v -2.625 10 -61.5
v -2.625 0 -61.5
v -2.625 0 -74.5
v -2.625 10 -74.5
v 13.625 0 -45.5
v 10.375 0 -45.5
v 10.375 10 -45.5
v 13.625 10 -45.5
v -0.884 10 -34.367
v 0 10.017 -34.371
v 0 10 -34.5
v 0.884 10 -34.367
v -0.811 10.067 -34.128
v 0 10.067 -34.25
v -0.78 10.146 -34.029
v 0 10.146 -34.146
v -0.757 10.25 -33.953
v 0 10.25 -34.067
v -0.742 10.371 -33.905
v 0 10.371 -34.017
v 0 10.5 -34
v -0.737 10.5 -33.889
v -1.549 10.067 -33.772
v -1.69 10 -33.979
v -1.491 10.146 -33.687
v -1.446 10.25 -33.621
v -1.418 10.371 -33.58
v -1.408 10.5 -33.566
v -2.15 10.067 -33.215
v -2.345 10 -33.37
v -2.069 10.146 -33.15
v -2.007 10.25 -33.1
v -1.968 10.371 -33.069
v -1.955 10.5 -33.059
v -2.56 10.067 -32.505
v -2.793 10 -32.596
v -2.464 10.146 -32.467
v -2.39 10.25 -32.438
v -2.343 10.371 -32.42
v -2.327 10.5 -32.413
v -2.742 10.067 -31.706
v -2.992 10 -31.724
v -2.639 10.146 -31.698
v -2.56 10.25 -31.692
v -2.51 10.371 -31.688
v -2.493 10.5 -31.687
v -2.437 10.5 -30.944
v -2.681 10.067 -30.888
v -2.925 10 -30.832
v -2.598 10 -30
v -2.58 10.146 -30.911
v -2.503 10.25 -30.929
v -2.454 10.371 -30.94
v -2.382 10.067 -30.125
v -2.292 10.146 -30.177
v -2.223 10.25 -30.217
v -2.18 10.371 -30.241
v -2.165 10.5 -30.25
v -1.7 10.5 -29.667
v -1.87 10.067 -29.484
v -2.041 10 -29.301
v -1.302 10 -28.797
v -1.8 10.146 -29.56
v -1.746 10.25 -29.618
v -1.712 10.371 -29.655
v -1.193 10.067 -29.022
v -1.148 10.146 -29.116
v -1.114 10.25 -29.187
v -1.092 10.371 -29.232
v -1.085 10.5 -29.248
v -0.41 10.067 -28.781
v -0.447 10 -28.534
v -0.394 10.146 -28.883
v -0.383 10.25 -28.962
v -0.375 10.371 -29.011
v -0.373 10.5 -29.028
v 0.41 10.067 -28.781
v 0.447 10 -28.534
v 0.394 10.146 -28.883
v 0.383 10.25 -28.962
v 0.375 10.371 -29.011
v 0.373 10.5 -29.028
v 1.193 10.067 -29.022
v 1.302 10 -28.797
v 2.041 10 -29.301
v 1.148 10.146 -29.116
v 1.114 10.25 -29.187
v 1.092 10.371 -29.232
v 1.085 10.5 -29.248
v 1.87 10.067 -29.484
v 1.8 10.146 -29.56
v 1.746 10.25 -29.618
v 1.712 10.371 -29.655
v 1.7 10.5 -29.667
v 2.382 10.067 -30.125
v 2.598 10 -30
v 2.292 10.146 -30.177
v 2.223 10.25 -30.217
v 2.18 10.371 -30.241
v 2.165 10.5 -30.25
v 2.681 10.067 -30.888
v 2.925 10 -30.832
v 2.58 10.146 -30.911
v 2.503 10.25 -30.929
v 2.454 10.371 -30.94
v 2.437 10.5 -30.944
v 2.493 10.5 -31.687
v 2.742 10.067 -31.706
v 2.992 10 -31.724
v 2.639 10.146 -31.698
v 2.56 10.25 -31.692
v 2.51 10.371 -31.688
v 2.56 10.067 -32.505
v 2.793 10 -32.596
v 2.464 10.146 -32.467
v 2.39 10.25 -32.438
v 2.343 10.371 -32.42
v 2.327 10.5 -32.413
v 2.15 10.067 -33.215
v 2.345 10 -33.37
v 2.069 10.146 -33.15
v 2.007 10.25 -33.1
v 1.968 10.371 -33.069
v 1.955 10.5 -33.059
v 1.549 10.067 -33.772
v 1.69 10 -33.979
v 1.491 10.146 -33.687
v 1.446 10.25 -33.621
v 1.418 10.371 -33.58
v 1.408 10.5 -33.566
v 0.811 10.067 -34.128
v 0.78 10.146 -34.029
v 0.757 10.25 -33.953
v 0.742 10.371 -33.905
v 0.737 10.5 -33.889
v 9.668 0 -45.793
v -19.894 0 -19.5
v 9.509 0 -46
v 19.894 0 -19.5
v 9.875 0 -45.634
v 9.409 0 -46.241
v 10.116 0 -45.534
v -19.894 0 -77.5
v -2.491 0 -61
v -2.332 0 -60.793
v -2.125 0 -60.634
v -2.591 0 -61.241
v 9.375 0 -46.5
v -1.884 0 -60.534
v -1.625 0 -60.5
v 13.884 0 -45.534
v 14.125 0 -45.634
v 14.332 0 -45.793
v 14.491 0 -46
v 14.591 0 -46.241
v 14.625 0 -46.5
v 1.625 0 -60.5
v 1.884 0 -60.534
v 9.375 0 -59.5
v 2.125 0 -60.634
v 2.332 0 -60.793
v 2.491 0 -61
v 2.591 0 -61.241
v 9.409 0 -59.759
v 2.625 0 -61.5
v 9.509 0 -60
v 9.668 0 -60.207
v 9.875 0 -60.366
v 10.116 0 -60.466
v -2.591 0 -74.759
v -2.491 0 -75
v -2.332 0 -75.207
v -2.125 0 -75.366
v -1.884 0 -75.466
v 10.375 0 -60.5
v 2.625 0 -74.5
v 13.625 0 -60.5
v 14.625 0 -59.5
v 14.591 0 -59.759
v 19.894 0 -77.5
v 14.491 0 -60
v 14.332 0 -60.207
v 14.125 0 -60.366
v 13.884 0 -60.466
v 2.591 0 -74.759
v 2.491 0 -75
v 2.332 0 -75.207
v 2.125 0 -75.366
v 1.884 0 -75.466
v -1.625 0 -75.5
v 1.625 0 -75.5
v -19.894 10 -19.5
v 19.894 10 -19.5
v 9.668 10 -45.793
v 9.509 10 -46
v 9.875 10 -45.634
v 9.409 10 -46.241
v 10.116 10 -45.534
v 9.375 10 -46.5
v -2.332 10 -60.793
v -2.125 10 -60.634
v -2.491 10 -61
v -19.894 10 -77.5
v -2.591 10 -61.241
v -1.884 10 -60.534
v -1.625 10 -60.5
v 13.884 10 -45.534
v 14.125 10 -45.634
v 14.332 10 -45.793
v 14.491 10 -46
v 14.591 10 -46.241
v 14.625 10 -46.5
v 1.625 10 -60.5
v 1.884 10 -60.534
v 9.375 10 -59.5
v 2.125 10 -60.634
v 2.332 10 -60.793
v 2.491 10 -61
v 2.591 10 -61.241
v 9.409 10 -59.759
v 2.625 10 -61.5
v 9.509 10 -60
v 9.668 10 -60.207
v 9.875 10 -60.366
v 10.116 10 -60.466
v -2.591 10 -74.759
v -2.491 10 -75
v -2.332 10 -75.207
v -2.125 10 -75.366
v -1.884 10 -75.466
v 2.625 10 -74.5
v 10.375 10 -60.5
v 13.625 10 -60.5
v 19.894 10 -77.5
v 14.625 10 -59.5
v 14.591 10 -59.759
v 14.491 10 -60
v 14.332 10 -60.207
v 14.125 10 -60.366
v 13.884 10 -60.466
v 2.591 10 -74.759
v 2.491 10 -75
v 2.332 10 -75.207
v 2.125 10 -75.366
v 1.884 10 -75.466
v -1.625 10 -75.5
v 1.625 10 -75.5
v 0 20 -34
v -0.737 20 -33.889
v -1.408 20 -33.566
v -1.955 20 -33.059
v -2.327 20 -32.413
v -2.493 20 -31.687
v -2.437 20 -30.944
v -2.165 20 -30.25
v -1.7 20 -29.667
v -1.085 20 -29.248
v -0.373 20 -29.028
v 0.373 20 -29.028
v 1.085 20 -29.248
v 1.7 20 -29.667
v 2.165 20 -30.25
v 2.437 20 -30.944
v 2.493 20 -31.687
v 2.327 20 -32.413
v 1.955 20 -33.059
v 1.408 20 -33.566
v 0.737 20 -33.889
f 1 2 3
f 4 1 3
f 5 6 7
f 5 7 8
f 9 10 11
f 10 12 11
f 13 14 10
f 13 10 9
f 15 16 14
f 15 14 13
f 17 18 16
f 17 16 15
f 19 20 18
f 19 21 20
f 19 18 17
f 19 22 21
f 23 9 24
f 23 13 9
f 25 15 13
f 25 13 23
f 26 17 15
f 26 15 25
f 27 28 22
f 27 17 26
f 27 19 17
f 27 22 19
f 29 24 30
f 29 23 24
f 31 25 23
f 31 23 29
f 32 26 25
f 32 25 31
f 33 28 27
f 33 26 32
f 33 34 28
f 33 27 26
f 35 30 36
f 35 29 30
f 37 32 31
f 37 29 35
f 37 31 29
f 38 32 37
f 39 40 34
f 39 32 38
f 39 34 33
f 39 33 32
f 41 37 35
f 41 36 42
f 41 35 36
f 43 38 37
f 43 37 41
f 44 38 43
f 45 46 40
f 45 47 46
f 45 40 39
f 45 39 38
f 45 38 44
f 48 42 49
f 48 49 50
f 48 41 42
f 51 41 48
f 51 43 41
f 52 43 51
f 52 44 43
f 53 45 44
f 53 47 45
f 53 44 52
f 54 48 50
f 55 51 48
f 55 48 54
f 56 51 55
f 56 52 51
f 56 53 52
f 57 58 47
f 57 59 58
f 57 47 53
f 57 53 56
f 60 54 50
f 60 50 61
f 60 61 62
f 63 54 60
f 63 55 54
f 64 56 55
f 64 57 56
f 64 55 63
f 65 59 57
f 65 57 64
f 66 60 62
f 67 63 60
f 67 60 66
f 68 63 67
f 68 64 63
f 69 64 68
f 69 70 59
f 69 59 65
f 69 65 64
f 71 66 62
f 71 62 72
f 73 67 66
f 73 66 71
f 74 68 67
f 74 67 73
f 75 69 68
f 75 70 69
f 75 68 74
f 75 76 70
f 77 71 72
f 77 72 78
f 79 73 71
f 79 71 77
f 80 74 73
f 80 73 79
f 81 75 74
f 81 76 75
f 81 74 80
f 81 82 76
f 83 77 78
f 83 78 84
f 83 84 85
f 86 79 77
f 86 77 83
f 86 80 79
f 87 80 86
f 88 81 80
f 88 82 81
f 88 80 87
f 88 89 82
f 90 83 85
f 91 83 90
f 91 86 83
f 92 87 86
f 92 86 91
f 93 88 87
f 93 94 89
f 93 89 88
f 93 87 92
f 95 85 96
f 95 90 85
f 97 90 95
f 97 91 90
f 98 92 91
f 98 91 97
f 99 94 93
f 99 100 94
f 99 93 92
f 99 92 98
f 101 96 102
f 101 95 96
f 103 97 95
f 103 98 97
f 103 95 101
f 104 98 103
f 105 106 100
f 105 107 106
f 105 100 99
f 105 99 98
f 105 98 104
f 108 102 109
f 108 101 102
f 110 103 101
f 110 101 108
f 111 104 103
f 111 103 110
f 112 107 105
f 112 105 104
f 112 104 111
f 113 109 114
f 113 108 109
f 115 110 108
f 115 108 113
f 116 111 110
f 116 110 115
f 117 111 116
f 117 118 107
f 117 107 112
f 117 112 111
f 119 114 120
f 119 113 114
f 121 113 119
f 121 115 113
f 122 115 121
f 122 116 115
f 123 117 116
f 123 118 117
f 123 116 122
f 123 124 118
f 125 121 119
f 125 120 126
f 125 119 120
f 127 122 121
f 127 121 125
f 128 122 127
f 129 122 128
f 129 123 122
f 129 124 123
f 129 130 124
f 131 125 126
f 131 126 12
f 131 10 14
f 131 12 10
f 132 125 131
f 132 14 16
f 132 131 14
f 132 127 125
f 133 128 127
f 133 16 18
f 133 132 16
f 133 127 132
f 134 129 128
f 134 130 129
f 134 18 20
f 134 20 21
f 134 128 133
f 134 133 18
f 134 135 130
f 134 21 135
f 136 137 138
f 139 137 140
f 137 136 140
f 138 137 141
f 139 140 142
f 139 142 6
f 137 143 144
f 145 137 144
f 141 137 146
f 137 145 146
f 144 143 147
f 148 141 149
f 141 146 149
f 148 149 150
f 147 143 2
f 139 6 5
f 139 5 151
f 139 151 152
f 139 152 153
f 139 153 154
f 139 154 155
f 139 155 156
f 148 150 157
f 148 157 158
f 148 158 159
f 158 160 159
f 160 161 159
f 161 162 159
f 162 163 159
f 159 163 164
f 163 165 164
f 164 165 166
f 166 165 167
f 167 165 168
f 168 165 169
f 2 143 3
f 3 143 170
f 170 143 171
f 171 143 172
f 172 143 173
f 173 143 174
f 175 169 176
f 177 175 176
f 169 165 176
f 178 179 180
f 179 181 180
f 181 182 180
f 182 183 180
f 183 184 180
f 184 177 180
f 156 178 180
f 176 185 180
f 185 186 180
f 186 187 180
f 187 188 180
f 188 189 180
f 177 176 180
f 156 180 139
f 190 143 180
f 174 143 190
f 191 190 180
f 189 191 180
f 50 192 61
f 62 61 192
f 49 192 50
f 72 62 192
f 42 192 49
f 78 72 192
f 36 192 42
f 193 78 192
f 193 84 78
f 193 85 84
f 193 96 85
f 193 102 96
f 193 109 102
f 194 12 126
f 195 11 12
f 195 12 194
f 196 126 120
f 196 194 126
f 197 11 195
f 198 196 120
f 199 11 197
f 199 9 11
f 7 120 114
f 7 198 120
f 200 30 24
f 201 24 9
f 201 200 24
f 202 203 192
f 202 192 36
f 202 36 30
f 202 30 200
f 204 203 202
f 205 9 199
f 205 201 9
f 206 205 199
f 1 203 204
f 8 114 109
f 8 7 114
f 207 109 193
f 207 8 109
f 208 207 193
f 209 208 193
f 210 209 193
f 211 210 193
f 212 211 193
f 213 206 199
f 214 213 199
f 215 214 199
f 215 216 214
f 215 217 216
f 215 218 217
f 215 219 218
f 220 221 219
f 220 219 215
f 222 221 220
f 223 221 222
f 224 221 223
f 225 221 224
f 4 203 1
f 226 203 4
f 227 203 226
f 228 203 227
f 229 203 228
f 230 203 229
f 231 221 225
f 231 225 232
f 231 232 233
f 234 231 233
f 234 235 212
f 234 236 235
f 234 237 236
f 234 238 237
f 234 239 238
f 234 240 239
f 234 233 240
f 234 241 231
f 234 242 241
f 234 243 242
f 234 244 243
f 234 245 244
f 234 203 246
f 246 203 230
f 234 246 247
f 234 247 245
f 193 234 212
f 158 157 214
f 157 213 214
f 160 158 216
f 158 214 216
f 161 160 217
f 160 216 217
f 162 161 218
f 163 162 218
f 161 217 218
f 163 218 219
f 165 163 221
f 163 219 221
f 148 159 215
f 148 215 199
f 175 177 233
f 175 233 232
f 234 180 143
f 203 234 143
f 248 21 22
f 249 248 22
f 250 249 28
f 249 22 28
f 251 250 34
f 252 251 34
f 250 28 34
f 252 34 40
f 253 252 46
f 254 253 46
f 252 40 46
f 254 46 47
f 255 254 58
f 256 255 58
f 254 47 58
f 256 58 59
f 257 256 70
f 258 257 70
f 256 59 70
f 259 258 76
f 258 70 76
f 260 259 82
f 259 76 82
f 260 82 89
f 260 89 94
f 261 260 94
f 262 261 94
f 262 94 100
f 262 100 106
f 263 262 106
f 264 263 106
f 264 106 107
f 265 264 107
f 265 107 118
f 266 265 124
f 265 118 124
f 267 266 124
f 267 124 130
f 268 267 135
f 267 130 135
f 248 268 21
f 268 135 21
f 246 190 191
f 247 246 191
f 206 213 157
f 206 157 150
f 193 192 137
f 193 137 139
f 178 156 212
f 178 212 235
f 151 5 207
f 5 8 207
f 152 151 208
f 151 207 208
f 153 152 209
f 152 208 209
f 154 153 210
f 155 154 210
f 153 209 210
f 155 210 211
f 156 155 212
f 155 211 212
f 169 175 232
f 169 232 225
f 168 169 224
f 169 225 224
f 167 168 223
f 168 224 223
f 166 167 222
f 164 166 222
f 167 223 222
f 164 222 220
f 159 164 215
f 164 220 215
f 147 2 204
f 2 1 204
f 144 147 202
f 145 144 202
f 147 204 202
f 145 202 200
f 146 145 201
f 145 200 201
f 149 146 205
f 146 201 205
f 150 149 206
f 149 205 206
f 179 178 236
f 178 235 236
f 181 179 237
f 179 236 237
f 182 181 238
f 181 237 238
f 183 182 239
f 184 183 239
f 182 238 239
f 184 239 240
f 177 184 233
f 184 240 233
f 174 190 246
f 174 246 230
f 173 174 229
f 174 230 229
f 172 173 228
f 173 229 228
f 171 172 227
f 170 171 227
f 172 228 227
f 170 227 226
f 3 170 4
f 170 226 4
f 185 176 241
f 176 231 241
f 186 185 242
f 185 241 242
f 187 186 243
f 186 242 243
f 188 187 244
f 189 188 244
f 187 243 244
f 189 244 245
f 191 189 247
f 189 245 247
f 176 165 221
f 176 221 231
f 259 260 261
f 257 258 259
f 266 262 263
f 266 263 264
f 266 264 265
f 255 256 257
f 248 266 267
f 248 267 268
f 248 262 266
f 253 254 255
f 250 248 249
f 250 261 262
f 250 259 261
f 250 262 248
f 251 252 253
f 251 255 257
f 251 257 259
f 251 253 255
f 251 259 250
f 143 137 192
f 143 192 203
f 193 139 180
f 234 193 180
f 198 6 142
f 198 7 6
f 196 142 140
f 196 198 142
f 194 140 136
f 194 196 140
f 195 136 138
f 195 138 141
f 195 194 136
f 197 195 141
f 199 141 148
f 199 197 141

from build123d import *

# Parameters (mm, degrees)
BOSS_EXTRUDE1_DEPTH  = 10
FILLET2_R            = 1
FILLET2_OF_MIRROR1_R = 1
CUT_EXTRUDE1_DEPTH   = 81.635062113
FILLET3_R            = 1
SKETCH5_R            = 2.5
BOSS_EXTRUDE2_DEPTH  = 10
FILLET1_R            = 0.5
SKETCH6_W            = 39.78759817
SKETCH6_H            = 34
CUT_EXTRUDE2_DEPTH   = 10


with BuildPart() as part:
    # Sketch2 → Boss-Extrude1 (new body)
    with BuildSketch(Plane(origin=(0, 0, 0), x_dir=(1, 0, 0), z_dir=(0, 1, 0))):
        Polygon((-19.893799085, 77.5), (0, 77.5), (0, 75.5), (-2.625, 75.5), (-2.625, 73), (-2.625, 63), (-2.625, 60.5), (0, 60.5), (0, 60.375), (0, 2.5), (-2.625, 2.5), (-2.625, 0), (-2.625, -10), (-2.625, -12.5), (0, -12.5), (0, -14.5), (-19.893799085, -14.5), align=None)
    boss_extrude1 = extrude(amount=BOSS_EXTRUDE1_DEPTH)

    # Fillet2
    fillet2_edges = [part.edges().sort_by_distance(p)[0] for p in [
        (-2.625, 5, 12.5),
        (-2.625, 5, -2.5),
        (-2.625, 5, -60.5),
        (-2.625, 5, -75.5),
    ]]
    fillet(fillet2_edges, radius=FILLET2_R)

    # Mirror1: Boss-Extrude1 across Right Plane
    add(boss_extrude1.mirror(Plane(origin=(0, 0, 0), x_dir=(0, 0, -1), z_dir=(1, 0, 0))))

    # Fillet2 of Mirror1
    fillet2_of_mirror1_edges = [part.edges().sort_by_distance(p)[0] for p in [
        (2.625, 5, 12.5),
        (2.625, 5, -2.5),
        (2.625, 5, -60.5),
        (2.625, 5, -75.5),
    ]]
    fillet(fillet2_of_mirror1_edges, radius=FILLET2_OF_MIRROR1_R)

    # Sketch4 → Cut-Extrude1 (cut, through all)
    with BuildSketch(Plane(origin=(0, 0, 0), x_dir=(1, 0, 0), z_dir=(0, 1, 0))):
        Polygon((-14.625, 15), (-14.625, 5), (-14.625, 2.5), (-12, 2.5), (-9.375, 2.5), (-9.375, 5), (-9.375, 15), (-9.375, 17.5), (-12, 17.5), (-14.625, 17.5), align=None)
        Polygon((9.375, 58), (9.375, 48), (9.375, 45.5), (12, 45.5), (14.625, 45.5), (14.625, 48), (14.625, 58), (14.625, 60.5), (12, 60.5), (9.375, 60.5), align=None)
    extrude(amount=CUT_EXTRUDE1_DEPTH, mode=Mode.SUBTRACT)

    # Fillet3
    fillet3_edges = [part.edges().sort_by_distance(p)[0] for p in [
        (-14.625, 5, -17.5),
        (-14.625, 5, -2.5),
        (-9.375, 5, -2.5),
        (-9.375, 5, -17.5),
        (14.625, 5, -60.5),
        (9.375, 5, -60.5),
        (9.375, 5, -45.5),
        (14.625, 5, -45.5),
    ]]
    fillet(fillet3_edges, radius=FILLET3_R)

    # Sketch5 → Boss-Extrude2 (add)
    with BuildSketch(Plane(origin=(0, 10, 0), x_dir=(1, 0, 0), z_dir=(0, 1, 0))):
        with Locations(Location((0, 31.5, 0), (0, 0, 90))):
            Circle(SKETCH5_R)
    extrude(amount=BOSS_EXTRUDE2_DEPTH)

    # Fillet1
    fillet1_edges = [part.edges().sort_by_distance(p)[0] for p in [
        (0, 10, -29),
    ]]
    fillet(fillet1_edges, radius=FILLET1_R)

    # Sketch6 → Cut-Extrude2 (cut)
    with BuildSketch(Plane(origin=(0, 10, 0), x_dir=(1, 0, 0), z_dir=(0, 1, 0))):
        with Locations((0, 2.5)):
            Rectangle(SKETCH6_W, SKETCH6_H)
    extrude(amount=-CUT_EXTRUDE2_DEPTH, mode=Mode.SUBTRACT)


solid = part.part
